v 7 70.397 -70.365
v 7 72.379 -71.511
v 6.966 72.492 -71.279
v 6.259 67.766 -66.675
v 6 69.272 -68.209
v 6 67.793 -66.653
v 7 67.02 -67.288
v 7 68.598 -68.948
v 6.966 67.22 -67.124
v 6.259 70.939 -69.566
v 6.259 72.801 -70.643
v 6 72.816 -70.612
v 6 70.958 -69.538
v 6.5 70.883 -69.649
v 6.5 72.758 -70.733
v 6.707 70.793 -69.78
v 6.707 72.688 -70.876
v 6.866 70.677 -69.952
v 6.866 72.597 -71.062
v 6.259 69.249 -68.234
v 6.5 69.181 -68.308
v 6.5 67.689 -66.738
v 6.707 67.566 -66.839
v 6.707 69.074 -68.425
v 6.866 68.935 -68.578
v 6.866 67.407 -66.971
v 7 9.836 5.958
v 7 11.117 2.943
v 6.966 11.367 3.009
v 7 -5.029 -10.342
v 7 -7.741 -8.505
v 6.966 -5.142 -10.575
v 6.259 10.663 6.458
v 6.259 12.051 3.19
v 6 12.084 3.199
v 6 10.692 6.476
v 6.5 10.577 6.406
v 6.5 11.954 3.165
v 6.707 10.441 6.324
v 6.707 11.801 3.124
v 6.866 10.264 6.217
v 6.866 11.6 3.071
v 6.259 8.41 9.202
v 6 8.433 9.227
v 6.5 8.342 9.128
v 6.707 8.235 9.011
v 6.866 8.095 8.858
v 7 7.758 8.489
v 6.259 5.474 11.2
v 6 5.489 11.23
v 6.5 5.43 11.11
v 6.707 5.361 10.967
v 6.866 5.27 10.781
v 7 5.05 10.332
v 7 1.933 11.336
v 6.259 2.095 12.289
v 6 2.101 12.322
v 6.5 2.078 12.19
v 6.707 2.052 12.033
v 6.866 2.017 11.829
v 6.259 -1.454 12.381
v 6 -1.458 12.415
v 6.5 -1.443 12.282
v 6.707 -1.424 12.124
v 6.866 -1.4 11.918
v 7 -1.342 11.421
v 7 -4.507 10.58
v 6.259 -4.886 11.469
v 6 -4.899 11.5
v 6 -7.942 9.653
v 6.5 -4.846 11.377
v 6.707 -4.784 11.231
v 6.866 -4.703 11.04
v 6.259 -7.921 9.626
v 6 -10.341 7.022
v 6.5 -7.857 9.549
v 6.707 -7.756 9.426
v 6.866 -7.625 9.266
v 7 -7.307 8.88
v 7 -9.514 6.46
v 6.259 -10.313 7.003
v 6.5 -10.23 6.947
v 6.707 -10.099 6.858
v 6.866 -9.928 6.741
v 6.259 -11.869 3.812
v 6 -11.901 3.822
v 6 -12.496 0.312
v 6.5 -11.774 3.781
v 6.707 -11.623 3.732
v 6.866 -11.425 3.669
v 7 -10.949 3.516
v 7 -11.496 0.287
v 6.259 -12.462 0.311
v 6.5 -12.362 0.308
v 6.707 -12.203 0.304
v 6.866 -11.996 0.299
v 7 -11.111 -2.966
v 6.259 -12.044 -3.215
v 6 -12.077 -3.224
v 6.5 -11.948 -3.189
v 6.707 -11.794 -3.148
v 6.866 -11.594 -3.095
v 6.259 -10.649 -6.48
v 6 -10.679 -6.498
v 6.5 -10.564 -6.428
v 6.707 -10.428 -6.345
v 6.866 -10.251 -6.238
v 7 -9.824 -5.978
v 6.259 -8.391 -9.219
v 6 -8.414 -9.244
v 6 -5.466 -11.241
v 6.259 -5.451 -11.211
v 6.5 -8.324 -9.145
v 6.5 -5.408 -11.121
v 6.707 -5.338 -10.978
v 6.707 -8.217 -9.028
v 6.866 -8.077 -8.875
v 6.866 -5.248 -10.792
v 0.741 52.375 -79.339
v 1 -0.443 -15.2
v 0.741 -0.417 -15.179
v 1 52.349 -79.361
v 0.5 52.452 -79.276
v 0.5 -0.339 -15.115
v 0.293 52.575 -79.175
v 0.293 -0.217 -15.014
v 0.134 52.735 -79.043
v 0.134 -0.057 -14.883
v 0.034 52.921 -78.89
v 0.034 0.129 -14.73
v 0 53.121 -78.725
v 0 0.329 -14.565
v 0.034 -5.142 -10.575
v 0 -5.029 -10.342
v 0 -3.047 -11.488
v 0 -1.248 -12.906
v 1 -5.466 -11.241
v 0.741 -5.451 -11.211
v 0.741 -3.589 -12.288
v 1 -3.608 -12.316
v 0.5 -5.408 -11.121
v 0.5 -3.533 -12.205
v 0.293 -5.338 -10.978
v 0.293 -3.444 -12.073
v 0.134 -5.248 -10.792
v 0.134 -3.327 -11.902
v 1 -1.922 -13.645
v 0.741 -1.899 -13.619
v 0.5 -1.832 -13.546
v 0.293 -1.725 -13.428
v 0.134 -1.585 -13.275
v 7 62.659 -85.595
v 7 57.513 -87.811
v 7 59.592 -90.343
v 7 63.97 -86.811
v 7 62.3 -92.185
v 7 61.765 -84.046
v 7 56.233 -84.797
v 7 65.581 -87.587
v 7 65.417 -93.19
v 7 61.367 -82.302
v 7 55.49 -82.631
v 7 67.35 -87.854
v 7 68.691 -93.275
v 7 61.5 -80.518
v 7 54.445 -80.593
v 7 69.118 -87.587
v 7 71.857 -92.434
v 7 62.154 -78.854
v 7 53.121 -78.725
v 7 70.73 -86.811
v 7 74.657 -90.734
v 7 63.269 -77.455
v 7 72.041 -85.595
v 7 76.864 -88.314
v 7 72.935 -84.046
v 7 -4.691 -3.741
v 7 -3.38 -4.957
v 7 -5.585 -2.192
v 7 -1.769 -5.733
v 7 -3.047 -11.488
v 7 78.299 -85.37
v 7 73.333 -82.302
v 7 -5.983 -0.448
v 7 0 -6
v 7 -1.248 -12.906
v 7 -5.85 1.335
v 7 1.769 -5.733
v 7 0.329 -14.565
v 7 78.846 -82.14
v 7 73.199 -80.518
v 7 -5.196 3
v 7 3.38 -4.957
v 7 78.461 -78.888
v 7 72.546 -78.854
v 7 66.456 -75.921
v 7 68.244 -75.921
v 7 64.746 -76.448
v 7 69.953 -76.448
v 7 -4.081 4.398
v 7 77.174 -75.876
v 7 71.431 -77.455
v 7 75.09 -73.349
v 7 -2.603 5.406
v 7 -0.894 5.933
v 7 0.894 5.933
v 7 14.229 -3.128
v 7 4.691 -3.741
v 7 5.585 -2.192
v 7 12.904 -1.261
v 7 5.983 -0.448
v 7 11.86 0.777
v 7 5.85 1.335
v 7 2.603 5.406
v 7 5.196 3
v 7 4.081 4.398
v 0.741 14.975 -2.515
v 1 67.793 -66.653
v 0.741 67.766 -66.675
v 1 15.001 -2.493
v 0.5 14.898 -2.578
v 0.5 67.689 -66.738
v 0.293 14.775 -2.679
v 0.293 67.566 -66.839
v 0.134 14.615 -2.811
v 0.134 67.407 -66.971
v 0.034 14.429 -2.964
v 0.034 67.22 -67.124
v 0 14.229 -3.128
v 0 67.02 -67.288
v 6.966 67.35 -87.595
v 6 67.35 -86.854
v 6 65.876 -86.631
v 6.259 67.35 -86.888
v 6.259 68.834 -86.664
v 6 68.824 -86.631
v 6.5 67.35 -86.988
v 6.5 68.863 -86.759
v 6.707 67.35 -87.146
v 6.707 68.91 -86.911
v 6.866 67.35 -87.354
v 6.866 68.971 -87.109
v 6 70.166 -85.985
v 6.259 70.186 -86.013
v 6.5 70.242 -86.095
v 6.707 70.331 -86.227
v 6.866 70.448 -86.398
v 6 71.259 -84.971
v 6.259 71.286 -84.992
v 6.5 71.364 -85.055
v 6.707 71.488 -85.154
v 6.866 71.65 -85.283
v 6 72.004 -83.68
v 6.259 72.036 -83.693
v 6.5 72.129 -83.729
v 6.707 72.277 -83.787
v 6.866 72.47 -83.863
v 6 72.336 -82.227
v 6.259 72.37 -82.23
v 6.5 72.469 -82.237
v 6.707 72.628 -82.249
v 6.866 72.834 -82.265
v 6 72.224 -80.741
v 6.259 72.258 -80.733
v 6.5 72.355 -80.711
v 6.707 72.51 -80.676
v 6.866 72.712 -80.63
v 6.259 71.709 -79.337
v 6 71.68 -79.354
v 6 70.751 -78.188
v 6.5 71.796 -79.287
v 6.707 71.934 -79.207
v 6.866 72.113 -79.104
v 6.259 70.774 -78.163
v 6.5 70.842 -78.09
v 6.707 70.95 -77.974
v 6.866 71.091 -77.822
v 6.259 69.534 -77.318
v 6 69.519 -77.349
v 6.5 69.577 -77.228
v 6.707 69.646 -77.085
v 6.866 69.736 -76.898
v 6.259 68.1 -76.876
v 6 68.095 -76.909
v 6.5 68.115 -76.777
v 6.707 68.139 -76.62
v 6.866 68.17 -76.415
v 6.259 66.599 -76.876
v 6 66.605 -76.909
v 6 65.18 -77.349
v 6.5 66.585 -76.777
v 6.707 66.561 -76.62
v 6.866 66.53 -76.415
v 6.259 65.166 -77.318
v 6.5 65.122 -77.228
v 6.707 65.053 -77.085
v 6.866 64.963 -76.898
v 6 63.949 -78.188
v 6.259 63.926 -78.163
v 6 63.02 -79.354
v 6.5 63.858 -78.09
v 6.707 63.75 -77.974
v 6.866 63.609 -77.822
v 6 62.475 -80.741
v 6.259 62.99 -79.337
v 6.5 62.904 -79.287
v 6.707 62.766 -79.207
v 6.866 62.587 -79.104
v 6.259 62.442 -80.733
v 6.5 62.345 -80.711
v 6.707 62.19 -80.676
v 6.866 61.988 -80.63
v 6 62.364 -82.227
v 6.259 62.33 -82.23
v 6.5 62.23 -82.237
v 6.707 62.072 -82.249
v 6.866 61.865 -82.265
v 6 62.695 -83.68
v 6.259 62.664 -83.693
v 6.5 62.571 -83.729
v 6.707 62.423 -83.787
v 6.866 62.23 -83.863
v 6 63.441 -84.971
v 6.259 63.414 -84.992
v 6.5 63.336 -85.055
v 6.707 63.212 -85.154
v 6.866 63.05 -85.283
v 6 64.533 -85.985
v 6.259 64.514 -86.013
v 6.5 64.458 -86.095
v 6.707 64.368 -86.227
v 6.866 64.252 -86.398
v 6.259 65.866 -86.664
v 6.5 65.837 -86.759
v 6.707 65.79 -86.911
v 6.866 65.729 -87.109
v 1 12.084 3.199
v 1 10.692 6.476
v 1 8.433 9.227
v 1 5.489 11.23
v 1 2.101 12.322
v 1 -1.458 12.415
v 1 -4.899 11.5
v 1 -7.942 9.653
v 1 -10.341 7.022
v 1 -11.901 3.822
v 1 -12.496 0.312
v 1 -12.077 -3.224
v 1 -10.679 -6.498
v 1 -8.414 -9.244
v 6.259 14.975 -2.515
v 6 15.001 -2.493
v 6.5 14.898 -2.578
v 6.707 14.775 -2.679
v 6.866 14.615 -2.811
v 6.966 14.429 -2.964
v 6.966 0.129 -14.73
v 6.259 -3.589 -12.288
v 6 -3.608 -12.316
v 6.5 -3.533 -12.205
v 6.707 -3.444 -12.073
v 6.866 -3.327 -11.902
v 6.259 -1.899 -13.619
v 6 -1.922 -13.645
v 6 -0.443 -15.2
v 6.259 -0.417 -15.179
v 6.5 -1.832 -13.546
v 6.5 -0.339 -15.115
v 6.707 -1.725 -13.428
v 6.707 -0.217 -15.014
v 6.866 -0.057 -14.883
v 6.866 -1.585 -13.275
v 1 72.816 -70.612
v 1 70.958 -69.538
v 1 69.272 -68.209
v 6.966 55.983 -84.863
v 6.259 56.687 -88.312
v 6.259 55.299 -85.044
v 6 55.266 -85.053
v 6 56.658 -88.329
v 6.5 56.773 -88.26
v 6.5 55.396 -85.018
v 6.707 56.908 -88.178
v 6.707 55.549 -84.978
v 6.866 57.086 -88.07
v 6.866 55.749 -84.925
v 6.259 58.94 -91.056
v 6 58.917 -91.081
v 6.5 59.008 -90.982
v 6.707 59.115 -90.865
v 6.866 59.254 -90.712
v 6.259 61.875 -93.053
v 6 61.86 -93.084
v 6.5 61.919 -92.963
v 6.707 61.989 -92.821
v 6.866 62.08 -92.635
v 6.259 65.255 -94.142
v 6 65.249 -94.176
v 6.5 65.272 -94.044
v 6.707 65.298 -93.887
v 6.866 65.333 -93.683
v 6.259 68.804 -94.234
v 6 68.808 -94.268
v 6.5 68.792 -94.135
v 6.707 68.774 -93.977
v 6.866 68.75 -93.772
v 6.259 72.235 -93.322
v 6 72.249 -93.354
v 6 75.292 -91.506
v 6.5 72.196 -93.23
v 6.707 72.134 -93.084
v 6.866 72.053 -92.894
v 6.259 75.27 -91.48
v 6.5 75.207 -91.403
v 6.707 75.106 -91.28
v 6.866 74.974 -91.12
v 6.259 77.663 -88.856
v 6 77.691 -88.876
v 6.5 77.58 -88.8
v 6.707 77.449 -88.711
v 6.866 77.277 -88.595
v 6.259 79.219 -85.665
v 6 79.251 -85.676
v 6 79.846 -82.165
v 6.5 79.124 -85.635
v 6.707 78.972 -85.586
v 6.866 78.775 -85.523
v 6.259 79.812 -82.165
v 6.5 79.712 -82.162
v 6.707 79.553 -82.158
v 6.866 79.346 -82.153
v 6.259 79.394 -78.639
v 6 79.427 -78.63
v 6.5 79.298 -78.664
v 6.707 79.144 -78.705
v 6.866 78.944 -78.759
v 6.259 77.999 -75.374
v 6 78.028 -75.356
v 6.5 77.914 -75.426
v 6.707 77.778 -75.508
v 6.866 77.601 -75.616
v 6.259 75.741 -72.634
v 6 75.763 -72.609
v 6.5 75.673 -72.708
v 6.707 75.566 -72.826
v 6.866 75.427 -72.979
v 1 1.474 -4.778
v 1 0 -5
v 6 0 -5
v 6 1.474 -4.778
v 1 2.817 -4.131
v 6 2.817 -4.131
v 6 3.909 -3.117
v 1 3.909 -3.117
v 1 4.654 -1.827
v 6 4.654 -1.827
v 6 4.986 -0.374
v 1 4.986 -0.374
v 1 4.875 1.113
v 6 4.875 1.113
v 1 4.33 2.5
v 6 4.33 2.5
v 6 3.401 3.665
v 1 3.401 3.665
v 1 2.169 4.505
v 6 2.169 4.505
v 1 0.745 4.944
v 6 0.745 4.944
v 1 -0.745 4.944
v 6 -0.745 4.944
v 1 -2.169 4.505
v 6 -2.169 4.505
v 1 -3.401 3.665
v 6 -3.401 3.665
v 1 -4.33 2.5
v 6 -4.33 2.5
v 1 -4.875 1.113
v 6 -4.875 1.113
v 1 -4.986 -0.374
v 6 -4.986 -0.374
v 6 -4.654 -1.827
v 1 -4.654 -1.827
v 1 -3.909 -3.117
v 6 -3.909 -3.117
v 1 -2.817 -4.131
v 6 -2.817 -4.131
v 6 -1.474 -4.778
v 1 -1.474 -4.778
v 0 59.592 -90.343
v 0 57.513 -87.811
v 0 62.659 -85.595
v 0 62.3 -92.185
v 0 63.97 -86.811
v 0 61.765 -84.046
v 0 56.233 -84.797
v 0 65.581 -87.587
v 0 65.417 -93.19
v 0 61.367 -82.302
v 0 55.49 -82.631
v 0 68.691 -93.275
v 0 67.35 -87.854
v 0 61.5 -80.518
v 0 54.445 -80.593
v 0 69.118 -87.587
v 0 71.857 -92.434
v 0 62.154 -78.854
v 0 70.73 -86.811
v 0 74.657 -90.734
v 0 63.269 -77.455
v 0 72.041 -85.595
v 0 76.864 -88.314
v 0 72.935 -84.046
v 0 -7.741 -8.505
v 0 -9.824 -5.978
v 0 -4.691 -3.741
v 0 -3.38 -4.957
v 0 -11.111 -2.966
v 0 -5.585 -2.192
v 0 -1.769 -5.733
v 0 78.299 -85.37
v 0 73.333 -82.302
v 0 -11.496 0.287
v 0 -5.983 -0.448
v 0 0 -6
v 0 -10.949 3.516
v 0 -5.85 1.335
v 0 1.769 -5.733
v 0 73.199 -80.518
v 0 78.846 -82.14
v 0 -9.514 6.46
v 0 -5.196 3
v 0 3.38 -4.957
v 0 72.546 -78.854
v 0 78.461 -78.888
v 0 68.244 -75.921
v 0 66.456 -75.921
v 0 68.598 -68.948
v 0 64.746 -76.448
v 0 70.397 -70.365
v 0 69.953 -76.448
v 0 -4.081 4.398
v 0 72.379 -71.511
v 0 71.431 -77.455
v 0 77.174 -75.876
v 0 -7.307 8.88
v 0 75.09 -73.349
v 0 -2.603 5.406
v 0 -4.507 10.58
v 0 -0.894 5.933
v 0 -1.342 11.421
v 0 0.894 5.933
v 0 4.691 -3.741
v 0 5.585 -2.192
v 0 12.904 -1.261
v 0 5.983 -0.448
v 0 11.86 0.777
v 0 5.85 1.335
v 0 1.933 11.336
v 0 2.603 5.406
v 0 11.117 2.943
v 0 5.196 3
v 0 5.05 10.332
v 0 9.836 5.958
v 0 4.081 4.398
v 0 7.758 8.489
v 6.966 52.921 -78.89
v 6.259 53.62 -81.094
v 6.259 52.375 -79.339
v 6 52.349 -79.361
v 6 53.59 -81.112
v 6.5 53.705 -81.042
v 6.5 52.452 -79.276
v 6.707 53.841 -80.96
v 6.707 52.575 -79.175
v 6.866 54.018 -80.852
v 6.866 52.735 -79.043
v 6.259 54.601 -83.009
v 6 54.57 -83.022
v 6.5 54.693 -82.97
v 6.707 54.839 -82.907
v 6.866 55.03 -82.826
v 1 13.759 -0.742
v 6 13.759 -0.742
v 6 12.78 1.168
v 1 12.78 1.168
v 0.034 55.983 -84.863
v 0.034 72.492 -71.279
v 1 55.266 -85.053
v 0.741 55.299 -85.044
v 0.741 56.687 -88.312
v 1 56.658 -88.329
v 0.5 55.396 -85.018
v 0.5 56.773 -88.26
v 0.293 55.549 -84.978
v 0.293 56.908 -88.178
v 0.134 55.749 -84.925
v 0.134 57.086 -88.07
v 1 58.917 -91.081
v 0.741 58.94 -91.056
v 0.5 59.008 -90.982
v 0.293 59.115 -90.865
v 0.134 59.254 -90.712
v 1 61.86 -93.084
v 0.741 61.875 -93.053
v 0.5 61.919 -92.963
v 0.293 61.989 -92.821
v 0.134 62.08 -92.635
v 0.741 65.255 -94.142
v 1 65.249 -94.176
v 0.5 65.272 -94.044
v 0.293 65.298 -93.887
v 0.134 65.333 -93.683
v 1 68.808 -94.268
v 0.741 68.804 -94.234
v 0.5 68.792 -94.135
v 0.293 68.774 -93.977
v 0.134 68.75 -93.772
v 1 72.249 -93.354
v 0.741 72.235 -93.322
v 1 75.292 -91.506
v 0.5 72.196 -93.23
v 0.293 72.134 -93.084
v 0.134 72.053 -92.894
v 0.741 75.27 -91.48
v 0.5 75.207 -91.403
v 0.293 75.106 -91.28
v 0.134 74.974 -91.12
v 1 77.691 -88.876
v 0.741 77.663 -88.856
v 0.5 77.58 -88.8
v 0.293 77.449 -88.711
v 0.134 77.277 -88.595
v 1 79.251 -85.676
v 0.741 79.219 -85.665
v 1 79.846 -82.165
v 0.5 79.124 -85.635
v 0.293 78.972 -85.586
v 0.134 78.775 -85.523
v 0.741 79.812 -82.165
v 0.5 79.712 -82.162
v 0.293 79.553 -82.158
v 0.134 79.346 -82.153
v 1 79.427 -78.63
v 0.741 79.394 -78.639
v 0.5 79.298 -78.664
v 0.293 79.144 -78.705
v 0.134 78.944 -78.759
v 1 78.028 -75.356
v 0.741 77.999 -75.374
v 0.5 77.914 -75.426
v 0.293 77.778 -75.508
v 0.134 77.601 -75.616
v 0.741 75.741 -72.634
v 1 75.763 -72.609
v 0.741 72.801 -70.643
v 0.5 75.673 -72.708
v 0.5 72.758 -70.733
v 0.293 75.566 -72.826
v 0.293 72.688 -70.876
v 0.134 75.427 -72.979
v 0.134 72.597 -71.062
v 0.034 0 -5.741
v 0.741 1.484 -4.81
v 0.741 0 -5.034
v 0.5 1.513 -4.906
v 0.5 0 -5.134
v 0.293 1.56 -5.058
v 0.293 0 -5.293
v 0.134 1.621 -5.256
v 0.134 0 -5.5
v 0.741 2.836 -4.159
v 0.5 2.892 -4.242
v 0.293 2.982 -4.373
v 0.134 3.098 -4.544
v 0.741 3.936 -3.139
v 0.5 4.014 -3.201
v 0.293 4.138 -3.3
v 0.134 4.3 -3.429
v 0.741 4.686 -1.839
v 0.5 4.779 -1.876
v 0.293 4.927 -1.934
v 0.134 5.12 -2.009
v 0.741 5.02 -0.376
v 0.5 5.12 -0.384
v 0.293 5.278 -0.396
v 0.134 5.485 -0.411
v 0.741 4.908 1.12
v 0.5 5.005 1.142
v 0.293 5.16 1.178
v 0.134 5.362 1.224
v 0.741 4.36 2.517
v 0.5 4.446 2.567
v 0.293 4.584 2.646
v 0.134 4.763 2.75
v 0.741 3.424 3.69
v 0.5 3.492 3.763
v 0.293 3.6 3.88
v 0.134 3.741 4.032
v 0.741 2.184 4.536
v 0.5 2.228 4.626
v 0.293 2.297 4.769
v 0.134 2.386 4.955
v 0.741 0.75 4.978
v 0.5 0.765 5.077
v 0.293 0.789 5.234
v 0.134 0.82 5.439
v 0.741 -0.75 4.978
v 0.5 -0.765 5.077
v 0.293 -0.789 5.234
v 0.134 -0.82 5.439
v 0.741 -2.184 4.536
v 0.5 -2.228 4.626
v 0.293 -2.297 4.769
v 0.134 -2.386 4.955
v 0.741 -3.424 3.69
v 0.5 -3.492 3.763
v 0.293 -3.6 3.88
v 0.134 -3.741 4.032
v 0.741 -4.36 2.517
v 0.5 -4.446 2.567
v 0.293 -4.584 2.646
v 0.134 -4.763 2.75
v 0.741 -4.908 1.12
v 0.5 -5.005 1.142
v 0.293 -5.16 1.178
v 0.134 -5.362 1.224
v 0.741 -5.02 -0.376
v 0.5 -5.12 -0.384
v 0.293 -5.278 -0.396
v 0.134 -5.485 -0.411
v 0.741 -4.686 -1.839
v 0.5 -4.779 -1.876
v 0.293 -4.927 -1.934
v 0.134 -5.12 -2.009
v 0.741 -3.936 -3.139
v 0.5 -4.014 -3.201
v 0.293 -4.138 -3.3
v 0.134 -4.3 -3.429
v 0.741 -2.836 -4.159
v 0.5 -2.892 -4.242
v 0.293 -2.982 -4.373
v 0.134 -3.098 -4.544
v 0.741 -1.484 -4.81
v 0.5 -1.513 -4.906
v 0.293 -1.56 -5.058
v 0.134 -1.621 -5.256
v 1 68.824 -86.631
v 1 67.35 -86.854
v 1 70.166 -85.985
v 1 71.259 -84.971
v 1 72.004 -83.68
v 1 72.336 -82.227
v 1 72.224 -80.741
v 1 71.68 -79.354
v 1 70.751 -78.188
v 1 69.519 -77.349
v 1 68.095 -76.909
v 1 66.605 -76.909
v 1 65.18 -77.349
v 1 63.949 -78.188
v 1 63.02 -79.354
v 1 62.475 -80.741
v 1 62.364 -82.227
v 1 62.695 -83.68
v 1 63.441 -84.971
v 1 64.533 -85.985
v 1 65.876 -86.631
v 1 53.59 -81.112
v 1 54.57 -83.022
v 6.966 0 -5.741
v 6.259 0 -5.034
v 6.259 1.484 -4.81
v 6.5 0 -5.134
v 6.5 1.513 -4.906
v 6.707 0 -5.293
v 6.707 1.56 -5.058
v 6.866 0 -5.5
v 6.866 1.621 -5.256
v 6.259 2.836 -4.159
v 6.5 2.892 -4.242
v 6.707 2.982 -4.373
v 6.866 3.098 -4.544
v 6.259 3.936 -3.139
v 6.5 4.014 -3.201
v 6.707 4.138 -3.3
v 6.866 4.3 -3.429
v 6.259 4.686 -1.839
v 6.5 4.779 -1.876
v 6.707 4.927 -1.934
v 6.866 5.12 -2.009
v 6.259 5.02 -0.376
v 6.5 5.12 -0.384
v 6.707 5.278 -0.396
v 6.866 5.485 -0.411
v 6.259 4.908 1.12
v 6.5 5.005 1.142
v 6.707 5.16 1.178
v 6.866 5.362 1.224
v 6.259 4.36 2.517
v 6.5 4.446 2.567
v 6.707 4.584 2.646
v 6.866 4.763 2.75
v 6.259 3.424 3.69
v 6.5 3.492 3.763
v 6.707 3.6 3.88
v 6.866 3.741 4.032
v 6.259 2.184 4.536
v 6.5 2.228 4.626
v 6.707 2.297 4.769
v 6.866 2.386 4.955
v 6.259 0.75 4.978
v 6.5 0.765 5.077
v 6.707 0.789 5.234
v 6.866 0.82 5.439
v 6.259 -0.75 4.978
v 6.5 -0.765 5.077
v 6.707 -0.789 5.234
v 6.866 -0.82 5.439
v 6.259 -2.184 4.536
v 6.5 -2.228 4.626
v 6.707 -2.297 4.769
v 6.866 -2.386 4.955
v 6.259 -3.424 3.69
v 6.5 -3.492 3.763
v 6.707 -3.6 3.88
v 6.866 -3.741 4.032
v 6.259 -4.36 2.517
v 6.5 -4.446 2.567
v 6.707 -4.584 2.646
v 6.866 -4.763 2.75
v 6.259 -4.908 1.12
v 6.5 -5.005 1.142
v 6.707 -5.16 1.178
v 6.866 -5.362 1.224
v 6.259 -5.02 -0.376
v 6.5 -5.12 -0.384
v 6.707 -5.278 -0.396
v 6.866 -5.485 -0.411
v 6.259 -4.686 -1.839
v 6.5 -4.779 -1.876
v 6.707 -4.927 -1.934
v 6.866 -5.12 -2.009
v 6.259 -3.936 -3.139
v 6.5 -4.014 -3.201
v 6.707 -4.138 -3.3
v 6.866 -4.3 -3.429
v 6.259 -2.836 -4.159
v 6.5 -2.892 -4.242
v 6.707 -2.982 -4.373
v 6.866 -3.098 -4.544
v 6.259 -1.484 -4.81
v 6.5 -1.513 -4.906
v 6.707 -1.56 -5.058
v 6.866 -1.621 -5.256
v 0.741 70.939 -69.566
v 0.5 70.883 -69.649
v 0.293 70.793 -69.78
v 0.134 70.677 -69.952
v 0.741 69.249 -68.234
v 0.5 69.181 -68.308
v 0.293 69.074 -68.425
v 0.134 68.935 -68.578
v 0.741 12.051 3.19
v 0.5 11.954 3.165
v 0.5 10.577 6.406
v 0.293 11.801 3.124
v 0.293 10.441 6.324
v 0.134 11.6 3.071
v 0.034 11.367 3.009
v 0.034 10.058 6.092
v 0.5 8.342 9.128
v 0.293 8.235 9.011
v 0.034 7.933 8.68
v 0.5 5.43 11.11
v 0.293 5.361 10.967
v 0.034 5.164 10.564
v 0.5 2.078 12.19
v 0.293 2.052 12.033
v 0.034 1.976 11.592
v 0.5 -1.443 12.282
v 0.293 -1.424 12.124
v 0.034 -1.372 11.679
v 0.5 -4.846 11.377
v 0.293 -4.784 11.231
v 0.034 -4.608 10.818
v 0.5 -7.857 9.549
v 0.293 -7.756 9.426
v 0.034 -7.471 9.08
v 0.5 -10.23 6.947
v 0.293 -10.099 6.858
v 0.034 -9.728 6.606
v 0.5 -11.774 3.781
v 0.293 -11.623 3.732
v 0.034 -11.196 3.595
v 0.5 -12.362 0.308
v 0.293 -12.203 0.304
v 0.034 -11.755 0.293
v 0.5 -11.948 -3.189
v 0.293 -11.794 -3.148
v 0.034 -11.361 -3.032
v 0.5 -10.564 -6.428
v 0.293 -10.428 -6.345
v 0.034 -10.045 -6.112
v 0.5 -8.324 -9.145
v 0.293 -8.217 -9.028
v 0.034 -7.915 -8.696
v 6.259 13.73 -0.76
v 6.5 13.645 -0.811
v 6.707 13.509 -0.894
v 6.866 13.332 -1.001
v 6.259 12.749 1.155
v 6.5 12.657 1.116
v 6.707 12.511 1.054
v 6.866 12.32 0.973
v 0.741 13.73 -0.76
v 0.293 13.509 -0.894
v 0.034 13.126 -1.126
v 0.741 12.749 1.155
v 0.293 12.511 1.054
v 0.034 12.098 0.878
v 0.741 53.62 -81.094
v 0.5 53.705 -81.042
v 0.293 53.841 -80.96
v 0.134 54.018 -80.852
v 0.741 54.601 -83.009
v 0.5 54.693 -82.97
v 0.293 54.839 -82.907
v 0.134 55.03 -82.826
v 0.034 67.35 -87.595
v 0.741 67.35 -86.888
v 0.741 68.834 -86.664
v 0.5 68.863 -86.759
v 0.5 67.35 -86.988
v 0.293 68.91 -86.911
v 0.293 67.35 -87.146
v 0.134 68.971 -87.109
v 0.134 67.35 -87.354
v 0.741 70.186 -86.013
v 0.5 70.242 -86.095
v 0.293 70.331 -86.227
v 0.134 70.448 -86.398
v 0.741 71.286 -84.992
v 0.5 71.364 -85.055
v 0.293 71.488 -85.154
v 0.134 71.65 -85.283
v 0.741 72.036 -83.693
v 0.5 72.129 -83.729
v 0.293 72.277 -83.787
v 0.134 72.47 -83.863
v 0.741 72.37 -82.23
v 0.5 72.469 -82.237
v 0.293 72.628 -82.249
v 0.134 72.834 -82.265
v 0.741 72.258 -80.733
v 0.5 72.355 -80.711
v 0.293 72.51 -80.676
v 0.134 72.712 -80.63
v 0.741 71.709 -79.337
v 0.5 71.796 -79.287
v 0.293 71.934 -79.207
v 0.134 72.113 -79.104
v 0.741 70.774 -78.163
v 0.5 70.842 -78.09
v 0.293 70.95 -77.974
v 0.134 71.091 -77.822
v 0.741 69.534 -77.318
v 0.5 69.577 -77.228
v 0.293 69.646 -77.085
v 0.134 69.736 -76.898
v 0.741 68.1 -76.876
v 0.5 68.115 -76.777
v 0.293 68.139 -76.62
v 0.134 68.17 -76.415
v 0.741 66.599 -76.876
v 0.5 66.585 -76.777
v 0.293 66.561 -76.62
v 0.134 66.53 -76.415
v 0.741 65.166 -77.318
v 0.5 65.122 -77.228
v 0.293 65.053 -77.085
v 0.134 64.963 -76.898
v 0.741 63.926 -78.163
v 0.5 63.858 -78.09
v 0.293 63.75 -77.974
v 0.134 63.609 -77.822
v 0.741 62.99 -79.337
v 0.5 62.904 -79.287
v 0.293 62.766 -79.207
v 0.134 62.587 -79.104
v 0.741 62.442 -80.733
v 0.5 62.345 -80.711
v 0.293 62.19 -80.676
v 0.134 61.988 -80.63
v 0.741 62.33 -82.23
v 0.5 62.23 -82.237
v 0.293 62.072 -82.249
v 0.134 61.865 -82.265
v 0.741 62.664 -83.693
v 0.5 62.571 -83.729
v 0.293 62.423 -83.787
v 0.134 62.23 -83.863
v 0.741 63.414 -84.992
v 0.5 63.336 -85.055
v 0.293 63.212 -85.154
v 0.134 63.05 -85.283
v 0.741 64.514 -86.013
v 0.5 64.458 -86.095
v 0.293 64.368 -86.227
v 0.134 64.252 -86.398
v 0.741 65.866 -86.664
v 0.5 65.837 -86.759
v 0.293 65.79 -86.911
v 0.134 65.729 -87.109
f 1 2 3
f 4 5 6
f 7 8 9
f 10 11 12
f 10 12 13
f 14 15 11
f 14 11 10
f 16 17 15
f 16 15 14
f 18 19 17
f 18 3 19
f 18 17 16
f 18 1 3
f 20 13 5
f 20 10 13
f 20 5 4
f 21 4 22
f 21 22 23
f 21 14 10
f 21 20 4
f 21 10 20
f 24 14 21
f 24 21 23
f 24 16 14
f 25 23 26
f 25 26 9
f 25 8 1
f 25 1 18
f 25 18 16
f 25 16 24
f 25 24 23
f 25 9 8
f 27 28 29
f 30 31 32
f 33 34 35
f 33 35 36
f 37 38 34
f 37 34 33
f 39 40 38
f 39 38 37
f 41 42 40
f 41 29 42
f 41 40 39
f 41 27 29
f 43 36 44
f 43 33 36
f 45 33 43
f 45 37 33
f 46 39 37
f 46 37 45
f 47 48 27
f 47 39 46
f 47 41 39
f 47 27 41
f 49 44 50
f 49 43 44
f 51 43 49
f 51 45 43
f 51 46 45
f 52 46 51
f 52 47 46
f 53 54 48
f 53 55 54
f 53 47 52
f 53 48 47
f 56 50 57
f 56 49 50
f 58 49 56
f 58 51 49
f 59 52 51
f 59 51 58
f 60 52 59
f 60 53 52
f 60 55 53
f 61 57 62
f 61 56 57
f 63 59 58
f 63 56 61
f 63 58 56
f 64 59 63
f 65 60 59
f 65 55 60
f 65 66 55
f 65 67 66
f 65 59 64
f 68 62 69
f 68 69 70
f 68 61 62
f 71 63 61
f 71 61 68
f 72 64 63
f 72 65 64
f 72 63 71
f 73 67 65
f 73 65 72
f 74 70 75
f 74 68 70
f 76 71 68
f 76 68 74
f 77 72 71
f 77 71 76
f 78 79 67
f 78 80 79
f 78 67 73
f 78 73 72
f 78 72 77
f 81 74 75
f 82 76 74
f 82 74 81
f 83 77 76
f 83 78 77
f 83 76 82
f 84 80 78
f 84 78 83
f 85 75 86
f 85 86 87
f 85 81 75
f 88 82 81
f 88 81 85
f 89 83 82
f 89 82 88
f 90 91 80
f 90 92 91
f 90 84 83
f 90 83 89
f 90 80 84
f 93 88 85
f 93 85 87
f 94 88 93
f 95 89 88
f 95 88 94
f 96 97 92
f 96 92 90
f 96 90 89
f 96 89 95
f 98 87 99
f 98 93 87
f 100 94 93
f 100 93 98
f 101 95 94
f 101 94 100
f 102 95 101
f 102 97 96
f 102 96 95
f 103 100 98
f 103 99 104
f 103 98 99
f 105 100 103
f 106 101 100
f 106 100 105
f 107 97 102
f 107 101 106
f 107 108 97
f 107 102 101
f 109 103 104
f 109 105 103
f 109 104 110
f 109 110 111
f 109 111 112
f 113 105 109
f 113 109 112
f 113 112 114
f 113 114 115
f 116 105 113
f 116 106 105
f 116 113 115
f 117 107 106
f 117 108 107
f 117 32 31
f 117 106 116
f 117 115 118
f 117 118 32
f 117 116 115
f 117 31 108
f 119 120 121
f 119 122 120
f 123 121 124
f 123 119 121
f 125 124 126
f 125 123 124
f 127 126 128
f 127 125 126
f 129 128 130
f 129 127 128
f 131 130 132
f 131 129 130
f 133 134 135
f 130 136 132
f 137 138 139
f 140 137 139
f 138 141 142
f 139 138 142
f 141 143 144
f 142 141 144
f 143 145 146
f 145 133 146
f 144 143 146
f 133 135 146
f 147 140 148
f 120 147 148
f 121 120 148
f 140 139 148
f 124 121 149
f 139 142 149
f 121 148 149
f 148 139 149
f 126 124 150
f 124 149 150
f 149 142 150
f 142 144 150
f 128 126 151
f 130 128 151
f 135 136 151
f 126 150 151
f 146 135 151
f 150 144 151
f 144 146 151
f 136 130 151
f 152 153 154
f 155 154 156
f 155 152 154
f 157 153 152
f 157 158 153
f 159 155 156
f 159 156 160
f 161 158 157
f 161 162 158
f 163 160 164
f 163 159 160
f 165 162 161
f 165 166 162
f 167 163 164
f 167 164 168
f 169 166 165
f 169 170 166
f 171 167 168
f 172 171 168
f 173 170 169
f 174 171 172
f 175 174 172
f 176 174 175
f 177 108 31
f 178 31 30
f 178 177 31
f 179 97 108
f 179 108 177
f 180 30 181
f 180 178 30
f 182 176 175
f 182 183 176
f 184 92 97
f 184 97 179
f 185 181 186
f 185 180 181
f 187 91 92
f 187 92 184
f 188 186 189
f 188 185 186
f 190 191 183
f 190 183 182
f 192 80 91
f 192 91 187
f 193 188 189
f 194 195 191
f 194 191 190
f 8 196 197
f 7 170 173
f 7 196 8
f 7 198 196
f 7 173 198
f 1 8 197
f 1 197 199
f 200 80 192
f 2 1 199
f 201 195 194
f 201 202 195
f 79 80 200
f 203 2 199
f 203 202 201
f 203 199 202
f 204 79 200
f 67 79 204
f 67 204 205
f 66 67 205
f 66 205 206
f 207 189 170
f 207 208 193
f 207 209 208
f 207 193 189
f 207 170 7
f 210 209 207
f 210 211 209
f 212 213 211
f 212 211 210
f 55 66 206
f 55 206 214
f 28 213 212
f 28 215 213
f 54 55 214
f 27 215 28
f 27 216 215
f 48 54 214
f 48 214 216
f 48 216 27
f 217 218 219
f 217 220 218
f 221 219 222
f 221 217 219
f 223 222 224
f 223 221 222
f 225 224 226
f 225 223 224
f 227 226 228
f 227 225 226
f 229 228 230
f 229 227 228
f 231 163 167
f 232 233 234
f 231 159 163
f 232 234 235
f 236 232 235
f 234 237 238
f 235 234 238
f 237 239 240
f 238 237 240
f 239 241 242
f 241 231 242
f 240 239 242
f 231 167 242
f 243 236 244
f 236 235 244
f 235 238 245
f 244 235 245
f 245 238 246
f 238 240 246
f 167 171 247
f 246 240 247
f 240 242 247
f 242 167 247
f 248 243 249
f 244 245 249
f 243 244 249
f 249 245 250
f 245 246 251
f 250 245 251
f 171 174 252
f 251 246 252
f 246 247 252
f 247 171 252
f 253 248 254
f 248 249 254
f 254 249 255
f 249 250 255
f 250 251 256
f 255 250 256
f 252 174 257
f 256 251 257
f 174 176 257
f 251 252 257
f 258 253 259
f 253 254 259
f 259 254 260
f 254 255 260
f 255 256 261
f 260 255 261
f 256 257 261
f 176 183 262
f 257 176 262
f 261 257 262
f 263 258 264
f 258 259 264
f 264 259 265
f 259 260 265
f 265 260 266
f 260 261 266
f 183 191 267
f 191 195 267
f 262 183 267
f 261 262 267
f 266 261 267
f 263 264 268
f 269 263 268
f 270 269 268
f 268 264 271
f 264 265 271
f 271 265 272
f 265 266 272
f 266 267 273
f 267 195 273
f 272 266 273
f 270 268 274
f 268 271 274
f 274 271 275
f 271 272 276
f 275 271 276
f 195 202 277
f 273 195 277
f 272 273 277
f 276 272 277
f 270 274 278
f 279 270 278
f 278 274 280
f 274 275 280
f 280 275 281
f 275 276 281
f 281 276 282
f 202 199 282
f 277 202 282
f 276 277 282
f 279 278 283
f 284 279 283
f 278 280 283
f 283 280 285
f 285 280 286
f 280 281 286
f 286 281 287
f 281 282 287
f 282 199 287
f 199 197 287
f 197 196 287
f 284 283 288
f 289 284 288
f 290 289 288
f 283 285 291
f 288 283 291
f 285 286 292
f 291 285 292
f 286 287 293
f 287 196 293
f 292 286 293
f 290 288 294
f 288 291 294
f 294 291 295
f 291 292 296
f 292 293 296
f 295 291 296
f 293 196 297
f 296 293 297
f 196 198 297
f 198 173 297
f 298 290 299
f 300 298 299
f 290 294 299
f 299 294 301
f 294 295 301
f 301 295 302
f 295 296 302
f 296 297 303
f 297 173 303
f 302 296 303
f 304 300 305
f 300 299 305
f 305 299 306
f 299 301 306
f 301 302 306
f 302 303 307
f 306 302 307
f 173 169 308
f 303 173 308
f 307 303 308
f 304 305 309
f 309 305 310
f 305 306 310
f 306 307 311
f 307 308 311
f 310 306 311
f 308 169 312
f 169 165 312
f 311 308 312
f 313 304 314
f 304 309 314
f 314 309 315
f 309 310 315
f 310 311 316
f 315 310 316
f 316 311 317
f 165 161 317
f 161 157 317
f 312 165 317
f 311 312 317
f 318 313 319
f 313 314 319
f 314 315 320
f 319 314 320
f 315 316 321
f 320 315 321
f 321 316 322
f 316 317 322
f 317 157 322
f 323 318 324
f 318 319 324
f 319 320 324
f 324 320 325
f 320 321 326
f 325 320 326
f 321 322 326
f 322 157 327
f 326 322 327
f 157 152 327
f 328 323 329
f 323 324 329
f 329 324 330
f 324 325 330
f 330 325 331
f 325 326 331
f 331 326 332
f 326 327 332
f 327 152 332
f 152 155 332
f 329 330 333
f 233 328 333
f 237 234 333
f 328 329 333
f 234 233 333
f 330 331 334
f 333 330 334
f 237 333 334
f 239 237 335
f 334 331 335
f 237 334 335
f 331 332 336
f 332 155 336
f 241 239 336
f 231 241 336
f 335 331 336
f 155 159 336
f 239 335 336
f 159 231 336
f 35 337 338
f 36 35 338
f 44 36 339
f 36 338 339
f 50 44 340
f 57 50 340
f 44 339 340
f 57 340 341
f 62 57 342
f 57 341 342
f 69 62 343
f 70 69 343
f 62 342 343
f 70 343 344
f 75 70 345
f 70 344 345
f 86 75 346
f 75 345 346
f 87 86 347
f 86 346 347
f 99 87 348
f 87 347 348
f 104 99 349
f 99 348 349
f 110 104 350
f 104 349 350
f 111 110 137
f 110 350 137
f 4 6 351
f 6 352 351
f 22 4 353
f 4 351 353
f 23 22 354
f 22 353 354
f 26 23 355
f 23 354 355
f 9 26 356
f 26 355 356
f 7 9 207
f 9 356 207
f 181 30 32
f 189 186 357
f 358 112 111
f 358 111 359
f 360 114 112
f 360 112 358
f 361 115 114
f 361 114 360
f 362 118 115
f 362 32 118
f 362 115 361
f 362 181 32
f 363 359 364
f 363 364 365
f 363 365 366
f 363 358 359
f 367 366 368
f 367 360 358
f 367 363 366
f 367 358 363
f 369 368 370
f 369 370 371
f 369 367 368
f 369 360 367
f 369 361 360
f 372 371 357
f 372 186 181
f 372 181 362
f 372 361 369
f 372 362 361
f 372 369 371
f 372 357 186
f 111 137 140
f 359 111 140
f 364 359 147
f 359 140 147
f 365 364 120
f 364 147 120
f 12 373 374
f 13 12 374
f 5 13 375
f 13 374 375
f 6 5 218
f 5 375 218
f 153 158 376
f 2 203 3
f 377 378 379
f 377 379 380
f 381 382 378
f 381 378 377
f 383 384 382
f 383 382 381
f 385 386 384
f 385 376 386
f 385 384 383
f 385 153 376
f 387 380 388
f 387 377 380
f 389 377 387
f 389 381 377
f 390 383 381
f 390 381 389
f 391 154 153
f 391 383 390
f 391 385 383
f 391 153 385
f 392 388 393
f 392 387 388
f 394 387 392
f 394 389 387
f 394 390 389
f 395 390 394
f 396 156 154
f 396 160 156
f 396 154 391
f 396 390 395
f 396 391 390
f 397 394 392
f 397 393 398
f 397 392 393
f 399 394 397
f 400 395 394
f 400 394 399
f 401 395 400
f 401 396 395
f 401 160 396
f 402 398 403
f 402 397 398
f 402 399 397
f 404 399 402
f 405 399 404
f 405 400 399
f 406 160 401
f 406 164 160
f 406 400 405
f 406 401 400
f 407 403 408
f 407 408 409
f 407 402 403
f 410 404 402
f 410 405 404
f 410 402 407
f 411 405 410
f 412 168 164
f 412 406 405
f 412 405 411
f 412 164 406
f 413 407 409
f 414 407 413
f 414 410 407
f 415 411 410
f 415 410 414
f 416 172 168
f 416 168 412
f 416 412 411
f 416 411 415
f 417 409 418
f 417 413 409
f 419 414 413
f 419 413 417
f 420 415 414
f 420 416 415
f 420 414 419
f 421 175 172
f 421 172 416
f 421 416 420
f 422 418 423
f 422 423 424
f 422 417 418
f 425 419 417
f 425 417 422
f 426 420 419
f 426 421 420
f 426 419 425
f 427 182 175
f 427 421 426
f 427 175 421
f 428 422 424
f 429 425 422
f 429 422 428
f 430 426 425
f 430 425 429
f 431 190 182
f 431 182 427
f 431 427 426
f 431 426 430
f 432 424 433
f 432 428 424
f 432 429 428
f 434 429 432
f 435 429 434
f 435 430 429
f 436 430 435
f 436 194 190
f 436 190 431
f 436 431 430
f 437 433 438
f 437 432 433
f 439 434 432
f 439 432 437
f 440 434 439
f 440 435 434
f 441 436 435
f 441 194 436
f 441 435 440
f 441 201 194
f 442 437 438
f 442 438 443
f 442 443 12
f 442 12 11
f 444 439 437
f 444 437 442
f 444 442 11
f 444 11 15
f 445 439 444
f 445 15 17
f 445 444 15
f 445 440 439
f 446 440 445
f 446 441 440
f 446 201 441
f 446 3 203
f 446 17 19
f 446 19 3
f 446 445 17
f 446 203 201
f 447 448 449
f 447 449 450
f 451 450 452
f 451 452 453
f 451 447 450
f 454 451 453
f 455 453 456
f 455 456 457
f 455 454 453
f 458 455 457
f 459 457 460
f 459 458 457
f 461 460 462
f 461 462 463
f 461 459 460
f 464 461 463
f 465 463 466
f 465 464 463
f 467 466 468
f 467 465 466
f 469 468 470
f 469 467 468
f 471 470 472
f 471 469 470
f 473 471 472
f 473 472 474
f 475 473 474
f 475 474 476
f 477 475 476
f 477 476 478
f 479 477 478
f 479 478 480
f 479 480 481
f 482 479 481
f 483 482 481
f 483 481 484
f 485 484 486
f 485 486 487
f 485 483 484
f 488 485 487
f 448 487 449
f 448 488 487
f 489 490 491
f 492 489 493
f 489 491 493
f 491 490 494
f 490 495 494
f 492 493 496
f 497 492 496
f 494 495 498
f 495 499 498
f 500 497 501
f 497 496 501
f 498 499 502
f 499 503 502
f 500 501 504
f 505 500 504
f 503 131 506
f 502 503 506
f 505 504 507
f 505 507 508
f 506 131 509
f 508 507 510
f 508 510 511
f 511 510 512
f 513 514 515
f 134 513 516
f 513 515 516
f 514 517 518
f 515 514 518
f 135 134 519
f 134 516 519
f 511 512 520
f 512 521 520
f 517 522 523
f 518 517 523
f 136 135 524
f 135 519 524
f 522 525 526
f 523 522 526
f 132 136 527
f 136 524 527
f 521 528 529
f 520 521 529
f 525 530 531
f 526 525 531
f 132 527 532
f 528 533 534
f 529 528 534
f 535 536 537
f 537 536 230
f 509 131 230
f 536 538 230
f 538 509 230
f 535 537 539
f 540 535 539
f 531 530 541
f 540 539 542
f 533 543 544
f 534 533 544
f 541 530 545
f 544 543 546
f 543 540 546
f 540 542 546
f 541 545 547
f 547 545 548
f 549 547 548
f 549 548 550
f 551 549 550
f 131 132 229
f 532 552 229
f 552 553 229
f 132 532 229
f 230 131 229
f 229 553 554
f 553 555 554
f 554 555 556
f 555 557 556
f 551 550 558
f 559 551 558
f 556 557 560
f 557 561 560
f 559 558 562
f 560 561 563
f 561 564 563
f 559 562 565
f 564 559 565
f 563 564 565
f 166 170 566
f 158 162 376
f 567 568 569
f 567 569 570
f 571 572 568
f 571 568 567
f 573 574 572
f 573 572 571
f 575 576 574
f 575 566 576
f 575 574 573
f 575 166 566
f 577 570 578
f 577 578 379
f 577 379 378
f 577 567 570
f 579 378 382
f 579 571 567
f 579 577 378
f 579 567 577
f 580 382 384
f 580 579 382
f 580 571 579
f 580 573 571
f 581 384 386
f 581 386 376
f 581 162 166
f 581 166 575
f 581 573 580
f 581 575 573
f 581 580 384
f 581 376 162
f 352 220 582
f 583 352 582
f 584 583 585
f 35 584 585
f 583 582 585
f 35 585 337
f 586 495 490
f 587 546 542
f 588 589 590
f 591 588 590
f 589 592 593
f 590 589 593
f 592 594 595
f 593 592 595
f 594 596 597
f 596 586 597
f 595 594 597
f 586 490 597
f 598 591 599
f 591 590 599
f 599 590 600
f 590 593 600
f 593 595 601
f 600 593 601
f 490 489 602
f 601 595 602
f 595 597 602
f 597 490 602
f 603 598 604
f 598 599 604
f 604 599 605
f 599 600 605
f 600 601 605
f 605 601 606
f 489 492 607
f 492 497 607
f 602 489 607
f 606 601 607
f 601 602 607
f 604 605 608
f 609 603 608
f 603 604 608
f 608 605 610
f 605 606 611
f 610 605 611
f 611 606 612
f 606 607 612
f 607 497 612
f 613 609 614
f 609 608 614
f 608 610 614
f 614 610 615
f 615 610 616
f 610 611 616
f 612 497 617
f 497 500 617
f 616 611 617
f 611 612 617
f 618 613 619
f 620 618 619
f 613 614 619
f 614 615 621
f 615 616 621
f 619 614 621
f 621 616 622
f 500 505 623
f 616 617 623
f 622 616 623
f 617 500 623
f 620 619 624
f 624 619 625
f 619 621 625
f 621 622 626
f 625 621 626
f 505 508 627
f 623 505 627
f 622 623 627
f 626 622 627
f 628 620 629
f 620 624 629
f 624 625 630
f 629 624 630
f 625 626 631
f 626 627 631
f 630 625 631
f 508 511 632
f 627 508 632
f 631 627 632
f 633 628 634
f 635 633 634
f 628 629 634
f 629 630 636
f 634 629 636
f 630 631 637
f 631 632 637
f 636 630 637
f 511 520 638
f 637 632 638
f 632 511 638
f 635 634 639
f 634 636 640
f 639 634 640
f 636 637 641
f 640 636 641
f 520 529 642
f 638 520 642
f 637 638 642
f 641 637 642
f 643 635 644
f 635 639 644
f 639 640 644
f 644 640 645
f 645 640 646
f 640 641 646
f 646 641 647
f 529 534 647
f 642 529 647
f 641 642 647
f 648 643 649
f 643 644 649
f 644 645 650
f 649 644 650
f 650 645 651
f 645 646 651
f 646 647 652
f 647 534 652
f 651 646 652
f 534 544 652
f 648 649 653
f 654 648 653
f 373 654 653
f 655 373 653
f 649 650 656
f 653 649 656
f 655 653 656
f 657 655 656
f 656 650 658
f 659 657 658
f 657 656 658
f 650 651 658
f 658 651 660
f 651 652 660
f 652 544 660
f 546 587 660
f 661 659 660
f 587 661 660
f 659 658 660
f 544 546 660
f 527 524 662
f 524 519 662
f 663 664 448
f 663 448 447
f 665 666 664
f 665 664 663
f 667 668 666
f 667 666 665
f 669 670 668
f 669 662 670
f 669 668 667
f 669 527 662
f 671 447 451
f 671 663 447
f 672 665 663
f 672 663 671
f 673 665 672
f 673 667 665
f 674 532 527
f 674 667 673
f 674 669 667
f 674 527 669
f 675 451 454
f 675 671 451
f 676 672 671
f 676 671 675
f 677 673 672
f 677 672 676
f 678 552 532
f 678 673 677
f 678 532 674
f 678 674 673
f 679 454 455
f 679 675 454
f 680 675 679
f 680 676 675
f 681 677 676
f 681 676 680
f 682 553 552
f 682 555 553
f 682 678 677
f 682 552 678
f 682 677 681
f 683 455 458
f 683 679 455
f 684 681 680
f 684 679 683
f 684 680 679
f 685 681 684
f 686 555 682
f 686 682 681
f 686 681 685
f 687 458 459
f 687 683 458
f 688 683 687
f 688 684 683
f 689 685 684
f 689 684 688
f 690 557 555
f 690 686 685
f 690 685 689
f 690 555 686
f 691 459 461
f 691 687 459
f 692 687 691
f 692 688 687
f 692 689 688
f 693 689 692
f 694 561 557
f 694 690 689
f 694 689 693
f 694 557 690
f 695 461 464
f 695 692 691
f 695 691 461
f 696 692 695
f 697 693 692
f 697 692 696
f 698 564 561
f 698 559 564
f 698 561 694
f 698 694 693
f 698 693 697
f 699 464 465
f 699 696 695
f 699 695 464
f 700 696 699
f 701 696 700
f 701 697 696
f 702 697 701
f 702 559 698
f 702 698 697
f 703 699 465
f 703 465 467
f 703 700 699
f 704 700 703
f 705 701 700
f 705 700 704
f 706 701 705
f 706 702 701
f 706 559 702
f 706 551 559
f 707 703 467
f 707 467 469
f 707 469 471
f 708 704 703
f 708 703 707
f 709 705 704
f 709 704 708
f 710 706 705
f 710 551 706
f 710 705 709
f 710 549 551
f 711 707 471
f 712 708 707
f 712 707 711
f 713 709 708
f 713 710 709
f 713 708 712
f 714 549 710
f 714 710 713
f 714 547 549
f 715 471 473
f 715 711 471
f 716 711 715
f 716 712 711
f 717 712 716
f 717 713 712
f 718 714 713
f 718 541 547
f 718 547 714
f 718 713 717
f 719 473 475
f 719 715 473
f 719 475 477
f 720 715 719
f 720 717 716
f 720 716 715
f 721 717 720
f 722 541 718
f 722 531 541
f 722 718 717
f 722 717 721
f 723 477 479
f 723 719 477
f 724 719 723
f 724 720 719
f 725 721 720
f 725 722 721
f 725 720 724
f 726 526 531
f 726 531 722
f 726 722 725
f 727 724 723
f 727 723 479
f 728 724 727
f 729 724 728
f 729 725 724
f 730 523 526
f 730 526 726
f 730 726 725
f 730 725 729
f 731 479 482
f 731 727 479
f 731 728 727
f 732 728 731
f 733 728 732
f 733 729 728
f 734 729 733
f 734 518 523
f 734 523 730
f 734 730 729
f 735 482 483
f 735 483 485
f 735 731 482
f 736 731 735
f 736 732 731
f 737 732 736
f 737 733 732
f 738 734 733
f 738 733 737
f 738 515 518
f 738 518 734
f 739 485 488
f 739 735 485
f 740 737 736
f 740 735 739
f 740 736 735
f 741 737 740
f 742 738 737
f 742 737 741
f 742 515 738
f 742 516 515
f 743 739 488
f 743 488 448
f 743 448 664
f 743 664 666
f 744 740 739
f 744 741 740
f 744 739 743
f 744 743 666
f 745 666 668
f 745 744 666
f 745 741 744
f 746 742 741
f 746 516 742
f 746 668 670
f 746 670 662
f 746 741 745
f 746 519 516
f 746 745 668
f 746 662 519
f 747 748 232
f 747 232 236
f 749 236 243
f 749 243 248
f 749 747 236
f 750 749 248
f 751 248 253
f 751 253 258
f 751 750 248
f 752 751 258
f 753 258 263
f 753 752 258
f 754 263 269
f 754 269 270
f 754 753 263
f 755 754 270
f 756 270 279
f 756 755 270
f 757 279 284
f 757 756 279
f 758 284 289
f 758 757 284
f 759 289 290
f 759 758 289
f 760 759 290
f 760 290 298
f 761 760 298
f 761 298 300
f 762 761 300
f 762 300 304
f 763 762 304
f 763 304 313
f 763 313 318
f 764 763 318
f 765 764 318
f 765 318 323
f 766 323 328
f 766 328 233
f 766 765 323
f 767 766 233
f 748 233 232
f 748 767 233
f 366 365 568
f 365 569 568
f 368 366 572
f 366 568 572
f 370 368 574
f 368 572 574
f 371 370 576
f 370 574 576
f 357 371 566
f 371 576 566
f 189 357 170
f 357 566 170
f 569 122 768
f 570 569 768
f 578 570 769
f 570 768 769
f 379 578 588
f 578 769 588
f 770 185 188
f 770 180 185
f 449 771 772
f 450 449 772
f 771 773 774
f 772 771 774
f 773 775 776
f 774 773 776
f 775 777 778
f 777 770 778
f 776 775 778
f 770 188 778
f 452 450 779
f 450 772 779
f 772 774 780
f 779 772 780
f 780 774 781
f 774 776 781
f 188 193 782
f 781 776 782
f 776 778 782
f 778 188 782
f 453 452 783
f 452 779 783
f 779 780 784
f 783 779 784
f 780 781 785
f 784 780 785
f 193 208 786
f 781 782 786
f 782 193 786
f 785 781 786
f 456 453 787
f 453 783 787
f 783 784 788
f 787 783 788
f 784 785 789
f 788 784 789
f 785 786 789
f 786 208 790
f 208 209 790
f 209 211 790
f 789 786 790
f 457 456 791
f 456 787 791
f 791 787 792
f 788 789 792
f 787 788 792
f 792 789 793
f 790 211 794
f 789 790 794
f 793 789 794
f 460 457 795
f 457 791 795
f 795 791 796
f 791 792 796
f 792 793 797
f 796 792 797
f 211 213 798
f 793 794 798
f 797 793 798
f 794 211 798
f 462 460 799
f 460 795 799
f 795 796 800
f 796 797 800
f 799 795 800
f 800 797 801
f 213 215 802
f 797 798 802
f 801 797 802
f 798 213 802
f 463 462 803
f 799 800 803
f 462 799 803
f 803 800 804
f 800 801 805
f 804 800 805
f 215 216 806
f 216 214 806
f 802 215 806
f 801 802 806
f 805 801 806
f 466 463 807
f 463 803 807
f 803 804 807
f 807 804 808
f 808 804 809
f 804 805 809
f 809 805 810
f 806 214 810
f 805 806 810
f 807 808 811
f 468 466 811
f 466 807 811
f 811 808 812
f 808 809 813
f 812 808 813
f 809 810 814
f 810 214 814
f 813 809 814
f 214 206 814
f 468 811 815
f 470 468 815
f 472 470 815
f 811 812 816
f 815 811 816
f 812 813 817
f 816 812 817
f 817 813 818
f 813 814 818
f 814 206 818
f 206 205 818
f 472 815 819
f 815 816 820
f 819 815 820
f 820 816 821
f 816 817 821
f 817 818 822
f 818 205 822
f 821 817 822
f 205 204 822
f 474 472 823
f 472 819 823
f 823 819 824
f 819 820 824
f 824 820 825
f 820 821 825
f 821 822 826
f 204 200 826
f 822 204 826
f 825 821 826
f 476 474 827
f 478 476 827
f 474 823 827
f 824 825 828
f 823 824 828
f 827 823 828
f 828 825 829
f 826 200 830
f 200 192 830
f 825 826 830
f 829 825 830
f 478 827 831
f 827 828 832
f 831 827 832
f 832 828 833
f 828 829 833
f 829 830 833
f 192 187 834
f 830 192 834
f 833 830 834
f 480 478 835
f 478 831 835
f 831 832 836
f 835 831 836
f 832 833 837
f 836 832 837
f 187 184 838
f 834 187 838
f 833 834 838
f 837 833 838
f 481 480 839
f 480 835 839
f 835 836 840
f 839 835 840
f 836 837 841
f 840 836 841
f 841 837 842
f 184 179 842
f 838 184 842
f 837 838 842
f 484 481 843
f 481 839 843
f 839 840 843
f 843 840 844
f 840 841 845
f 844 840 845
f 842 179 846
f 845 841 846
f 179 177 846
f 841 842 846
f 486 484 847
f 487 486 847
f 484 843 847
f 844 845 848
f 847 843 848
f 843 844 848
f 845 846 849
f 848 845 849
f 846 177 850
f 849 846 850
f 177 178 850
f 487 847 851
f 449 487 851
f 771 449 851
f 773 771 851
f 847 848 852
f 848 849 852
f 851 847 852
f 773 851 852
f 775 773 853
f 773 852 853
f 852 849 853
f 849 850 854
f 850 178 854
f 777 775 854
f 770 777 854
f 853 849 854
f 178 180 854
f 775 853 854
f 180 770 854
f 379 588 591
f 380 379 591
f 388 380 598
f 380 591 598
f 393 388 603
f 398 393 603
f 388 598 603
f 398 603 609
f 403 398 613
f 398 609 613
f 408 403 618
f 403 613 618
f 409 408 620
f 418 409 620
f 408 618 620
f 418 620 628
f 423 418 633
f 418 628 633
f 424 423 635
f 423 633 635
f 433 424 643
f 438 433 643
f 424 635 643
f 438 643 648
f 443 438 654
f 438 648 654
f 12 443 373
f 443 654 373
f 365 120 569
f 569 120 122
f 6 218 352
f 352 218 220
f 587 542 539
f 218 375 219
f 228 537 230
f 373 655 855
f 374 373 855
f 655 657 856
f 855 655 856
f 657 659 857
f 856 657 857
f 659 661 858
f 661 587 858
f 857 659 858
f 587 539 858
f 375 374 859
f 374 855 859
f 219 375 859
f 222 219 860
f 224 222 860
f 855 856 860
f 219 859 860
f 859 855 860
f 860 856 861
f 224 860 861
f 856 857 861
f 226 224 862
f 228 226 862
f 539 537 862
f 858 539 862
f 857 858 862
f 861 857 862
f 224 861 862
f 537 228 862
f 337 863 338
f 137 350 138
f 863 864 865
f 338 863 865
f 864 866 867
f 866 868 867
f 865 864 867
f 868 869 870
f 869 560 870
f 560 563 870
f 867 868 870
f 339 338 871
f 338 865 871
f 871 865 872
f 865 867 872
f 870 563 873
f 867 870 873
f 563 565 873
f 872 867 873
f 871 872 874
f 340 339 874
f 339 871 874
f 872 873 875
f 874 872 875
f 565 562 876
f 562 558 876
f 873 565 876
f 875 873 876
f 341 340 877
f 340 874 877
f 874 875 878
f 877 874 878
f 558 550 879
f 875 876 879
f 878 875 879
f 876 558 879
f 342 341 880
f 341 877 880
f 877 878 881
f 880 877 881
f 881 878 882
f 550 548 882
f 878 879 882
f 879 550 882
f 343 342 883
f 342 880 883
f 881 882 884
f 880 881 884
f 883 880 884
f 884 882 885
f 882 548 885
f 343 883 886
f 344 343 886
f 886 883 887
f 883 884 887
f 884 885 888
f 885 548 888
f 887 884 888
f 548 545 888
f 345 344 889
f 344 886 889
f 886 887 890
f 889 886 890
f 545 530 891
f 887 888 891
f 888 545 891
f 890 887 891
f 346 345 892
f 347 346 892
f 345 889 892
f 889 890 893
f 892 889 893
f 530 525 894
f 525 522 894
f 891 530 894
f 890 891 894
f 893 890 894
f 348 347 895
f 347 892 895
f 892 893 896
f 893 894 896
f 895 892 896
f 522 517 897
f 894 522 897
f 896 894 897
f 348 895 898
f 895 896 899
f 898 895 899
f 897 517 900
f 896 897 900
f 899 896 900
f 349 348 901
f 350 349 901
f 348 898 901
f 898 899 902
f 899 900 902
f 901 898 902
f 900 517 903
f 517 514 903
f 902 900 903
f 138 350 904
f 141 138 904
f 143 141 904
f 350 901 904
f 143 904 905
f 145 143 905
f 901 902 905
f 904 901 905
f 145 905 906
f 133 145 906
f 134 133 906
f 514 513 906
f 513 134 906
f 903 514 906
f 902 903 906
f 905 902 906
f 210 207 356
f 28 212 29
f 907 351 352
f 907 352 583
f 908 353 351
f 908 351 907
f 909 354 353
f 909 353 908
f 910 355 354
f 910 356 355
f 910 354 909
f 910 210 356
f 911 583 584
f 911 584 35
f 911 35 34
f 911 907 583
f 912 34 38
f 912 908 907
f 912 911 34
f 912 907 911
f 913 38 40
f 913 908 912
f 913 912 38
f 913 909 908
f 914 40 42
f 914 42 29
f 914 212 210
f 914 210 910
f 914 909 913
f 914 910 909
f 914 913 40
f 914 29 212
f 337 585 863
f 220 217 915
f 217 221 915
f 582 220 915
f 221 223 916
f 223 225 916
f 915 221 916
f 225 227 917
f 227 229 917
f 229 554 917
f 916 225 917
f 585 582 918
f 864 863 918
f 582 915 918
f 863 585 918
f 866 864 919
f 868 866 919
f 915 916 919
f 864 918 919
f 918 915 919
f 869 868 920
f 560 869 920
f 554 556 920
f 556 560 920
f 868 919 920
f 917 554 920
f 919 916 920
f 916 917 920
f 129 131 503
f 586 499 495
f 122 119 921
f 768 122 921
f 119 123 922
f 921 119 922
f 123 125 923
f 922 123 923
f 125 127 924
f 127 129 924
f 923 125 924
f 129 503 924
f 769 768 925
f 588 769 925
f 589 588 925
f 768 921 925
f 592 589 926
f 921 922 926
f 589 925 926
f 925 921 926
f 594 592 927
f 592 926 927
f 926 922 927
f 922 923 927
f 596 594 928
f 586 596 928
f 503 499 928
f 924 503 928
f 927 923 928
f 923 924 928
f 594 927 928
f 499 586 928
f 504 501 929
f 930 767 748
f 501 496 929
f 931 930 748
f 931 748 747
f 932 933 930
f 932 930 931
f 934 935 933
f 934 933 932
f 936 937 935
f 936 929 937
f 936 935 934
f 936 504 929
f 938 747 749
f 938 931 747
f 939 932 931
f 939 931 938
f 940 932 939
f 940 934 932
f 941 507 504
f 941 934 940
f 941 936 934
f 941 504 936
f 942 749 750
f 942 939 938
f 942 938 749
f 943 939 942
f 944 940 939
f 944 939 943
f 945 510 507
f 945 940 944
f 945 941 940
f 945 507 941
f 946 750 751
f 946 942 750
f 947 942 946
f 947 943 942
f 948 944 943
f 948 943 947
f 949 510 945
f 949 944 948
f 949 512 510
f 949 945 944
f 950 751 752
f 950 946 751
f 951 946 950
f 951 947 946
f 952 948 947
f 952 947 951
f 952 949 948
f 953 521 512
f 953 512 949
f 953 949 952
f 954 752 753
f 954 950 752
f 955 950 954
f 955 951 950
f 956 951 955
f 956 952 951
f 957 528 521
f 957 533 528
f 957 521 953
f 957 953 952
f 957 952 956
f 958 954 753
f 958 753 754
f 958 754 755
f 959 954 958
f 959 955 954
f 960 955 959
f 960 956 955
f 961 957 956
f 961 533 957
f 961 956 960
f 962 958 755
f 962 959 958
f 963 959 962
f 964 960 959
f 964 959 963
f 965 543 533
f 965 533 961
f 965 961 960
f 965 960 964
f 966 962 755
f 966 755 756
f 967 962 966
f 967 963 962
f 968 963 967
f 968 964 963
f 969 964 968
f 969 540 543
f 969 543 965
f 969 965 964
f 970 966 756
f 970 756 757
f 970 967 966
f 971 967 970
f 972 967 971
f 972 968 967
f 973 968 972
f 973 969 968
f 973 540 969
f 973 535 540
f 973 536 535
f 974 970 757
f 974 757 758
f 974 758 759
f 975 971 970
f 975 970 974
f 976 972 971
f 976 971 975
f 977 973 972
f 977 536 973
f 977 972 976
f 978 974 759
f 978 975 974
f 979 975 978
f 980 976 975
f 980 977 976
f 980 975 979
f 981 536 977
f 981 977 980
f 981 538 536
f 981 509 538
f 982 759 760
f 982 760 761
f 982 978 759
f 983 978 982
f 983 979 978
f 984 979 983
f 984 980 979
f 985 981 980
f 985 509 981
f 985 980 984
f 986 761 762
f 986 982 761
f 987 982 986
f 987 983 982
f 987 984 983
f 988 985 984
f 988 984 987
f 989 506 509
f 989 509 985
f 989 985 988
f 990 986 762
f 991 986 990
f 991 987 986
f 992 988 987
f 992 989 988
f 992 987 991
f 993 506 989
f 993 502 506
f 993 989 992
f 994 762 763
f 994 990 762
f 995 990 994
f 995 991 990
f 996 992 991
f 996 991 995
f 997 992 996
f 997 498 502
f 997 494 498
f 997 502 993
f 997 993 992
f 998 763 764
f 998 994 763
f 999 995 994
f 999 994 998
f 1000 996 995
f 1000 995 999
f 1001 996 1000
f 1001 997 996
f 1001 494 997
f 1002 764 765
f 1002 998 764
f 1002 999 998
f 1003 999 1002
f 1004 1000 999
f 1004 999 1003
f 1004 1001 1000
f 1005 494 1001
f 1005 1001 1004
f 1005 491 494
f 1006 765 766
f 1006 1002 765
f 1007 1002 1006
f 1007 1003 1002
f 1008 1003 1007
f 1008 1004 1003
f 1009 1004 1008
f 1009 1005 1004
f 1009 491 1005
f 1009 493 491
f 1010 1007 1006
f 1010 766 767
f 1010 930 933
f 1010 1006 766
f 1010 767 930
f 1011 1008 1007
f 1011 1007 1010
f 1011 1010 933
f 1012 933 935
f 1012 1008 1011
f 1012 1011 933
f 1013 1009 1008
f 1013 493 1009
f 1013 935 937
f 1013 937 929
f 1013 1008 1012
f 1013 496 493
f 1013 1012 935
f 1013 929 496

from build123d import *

# Parameters (mm, degrees)
SKETCH2_R           = 5
BOSS_EXTRUDE1_DEPTH = 7
FILLET1_R           = 1


with BuildPart() as part:
    # Sketch2 → Boss-Extrude1 (new body)
    with BuildSketch(Plane.YZ):
        with BuildLine():
            Line((67.792672883, -66.653119845), (15.001173208, -2.492950539))
            ThreePointArc((15.001173208, -2.492950539), (13.235549048, 0.195688878), (12.083739226, 3.198944565))
            ThreePointArc((12.083739226, 3.198944565), (-7.942190484, 9.65254424), (-5.466341212, -11.24140177))
            ThreePointArc((-5.466341212, -11.24140177), (-2.741147099, -12.950064298), (-0.442897577, -15.200455313))
            Line((-0.442897577, -15.200455313), (52.348602098, -79.36062462))
            ThreePointArc((52.348602098, -79.36062462), (54.114226258, -82.049264037), (55.26603608, -85.052519723))
            ThreePointArc((55.26603608, -85.052519723), (75.29196579, -91.506119399), (72.816116517, -70.612173388))
            ThreePointArc((72.816116517, -70.612173388), (70.090922405, -68.903510861), (67.792672883, -66.653119845))
        make_face()
        with Locations(Location((0, 0, 0), (0, 0, 270))):
            Circle(SKETCH2_R, mode=Mode.SUBTRACT)
        with Locations(Location((67.349775306, -81.853575159, 0), (0, 0, 270))):
            Circle(SKETCH2_R, mode=Mode.SUBTRACT)
    extrude(amount=BOSS_EXTRUDE1_DEPTH)

    # Fillet1
    fillet1_edges = [part.edges().sort_by_distance(p)[0] for p in [
        (0, -7.942190484, 9.65254424),
        (0, 13.235549048, 0.195688878),
        (0, 41.396923045, -34.573035192),
        (0, 70.090922405, -68.903510861),
        (7, 13.235549048, 0.195688878),
        (7, -7.942190484, 9.65254424),
        (7, -2.741147099, -12.950064298),
        (0, 0, 5),
        (7, 0, 5),
        (7, 25.952852261, -47.280539967),
        (0, 67.349775306, -76.853575159),
        (7, 67.349775306, -76.853575159),
        (7, 54.114226258, -82.049264037),
        (7, 75.29196579, -91.506119399),
        (7, 70.090922405, -68.903510861),
        (0, 75.29196579, -91.506119399),
        (7, 41.396923045, -34.573035192),
        (0, 54.114226258, -82.049264037),
        (0, 25.952852261, -47.280539967),
        (0, -2.741147099, -12.950064298),
    ]]
    fillet(fillet1_edges, radius=FILLET1_R)


solid = part.part
